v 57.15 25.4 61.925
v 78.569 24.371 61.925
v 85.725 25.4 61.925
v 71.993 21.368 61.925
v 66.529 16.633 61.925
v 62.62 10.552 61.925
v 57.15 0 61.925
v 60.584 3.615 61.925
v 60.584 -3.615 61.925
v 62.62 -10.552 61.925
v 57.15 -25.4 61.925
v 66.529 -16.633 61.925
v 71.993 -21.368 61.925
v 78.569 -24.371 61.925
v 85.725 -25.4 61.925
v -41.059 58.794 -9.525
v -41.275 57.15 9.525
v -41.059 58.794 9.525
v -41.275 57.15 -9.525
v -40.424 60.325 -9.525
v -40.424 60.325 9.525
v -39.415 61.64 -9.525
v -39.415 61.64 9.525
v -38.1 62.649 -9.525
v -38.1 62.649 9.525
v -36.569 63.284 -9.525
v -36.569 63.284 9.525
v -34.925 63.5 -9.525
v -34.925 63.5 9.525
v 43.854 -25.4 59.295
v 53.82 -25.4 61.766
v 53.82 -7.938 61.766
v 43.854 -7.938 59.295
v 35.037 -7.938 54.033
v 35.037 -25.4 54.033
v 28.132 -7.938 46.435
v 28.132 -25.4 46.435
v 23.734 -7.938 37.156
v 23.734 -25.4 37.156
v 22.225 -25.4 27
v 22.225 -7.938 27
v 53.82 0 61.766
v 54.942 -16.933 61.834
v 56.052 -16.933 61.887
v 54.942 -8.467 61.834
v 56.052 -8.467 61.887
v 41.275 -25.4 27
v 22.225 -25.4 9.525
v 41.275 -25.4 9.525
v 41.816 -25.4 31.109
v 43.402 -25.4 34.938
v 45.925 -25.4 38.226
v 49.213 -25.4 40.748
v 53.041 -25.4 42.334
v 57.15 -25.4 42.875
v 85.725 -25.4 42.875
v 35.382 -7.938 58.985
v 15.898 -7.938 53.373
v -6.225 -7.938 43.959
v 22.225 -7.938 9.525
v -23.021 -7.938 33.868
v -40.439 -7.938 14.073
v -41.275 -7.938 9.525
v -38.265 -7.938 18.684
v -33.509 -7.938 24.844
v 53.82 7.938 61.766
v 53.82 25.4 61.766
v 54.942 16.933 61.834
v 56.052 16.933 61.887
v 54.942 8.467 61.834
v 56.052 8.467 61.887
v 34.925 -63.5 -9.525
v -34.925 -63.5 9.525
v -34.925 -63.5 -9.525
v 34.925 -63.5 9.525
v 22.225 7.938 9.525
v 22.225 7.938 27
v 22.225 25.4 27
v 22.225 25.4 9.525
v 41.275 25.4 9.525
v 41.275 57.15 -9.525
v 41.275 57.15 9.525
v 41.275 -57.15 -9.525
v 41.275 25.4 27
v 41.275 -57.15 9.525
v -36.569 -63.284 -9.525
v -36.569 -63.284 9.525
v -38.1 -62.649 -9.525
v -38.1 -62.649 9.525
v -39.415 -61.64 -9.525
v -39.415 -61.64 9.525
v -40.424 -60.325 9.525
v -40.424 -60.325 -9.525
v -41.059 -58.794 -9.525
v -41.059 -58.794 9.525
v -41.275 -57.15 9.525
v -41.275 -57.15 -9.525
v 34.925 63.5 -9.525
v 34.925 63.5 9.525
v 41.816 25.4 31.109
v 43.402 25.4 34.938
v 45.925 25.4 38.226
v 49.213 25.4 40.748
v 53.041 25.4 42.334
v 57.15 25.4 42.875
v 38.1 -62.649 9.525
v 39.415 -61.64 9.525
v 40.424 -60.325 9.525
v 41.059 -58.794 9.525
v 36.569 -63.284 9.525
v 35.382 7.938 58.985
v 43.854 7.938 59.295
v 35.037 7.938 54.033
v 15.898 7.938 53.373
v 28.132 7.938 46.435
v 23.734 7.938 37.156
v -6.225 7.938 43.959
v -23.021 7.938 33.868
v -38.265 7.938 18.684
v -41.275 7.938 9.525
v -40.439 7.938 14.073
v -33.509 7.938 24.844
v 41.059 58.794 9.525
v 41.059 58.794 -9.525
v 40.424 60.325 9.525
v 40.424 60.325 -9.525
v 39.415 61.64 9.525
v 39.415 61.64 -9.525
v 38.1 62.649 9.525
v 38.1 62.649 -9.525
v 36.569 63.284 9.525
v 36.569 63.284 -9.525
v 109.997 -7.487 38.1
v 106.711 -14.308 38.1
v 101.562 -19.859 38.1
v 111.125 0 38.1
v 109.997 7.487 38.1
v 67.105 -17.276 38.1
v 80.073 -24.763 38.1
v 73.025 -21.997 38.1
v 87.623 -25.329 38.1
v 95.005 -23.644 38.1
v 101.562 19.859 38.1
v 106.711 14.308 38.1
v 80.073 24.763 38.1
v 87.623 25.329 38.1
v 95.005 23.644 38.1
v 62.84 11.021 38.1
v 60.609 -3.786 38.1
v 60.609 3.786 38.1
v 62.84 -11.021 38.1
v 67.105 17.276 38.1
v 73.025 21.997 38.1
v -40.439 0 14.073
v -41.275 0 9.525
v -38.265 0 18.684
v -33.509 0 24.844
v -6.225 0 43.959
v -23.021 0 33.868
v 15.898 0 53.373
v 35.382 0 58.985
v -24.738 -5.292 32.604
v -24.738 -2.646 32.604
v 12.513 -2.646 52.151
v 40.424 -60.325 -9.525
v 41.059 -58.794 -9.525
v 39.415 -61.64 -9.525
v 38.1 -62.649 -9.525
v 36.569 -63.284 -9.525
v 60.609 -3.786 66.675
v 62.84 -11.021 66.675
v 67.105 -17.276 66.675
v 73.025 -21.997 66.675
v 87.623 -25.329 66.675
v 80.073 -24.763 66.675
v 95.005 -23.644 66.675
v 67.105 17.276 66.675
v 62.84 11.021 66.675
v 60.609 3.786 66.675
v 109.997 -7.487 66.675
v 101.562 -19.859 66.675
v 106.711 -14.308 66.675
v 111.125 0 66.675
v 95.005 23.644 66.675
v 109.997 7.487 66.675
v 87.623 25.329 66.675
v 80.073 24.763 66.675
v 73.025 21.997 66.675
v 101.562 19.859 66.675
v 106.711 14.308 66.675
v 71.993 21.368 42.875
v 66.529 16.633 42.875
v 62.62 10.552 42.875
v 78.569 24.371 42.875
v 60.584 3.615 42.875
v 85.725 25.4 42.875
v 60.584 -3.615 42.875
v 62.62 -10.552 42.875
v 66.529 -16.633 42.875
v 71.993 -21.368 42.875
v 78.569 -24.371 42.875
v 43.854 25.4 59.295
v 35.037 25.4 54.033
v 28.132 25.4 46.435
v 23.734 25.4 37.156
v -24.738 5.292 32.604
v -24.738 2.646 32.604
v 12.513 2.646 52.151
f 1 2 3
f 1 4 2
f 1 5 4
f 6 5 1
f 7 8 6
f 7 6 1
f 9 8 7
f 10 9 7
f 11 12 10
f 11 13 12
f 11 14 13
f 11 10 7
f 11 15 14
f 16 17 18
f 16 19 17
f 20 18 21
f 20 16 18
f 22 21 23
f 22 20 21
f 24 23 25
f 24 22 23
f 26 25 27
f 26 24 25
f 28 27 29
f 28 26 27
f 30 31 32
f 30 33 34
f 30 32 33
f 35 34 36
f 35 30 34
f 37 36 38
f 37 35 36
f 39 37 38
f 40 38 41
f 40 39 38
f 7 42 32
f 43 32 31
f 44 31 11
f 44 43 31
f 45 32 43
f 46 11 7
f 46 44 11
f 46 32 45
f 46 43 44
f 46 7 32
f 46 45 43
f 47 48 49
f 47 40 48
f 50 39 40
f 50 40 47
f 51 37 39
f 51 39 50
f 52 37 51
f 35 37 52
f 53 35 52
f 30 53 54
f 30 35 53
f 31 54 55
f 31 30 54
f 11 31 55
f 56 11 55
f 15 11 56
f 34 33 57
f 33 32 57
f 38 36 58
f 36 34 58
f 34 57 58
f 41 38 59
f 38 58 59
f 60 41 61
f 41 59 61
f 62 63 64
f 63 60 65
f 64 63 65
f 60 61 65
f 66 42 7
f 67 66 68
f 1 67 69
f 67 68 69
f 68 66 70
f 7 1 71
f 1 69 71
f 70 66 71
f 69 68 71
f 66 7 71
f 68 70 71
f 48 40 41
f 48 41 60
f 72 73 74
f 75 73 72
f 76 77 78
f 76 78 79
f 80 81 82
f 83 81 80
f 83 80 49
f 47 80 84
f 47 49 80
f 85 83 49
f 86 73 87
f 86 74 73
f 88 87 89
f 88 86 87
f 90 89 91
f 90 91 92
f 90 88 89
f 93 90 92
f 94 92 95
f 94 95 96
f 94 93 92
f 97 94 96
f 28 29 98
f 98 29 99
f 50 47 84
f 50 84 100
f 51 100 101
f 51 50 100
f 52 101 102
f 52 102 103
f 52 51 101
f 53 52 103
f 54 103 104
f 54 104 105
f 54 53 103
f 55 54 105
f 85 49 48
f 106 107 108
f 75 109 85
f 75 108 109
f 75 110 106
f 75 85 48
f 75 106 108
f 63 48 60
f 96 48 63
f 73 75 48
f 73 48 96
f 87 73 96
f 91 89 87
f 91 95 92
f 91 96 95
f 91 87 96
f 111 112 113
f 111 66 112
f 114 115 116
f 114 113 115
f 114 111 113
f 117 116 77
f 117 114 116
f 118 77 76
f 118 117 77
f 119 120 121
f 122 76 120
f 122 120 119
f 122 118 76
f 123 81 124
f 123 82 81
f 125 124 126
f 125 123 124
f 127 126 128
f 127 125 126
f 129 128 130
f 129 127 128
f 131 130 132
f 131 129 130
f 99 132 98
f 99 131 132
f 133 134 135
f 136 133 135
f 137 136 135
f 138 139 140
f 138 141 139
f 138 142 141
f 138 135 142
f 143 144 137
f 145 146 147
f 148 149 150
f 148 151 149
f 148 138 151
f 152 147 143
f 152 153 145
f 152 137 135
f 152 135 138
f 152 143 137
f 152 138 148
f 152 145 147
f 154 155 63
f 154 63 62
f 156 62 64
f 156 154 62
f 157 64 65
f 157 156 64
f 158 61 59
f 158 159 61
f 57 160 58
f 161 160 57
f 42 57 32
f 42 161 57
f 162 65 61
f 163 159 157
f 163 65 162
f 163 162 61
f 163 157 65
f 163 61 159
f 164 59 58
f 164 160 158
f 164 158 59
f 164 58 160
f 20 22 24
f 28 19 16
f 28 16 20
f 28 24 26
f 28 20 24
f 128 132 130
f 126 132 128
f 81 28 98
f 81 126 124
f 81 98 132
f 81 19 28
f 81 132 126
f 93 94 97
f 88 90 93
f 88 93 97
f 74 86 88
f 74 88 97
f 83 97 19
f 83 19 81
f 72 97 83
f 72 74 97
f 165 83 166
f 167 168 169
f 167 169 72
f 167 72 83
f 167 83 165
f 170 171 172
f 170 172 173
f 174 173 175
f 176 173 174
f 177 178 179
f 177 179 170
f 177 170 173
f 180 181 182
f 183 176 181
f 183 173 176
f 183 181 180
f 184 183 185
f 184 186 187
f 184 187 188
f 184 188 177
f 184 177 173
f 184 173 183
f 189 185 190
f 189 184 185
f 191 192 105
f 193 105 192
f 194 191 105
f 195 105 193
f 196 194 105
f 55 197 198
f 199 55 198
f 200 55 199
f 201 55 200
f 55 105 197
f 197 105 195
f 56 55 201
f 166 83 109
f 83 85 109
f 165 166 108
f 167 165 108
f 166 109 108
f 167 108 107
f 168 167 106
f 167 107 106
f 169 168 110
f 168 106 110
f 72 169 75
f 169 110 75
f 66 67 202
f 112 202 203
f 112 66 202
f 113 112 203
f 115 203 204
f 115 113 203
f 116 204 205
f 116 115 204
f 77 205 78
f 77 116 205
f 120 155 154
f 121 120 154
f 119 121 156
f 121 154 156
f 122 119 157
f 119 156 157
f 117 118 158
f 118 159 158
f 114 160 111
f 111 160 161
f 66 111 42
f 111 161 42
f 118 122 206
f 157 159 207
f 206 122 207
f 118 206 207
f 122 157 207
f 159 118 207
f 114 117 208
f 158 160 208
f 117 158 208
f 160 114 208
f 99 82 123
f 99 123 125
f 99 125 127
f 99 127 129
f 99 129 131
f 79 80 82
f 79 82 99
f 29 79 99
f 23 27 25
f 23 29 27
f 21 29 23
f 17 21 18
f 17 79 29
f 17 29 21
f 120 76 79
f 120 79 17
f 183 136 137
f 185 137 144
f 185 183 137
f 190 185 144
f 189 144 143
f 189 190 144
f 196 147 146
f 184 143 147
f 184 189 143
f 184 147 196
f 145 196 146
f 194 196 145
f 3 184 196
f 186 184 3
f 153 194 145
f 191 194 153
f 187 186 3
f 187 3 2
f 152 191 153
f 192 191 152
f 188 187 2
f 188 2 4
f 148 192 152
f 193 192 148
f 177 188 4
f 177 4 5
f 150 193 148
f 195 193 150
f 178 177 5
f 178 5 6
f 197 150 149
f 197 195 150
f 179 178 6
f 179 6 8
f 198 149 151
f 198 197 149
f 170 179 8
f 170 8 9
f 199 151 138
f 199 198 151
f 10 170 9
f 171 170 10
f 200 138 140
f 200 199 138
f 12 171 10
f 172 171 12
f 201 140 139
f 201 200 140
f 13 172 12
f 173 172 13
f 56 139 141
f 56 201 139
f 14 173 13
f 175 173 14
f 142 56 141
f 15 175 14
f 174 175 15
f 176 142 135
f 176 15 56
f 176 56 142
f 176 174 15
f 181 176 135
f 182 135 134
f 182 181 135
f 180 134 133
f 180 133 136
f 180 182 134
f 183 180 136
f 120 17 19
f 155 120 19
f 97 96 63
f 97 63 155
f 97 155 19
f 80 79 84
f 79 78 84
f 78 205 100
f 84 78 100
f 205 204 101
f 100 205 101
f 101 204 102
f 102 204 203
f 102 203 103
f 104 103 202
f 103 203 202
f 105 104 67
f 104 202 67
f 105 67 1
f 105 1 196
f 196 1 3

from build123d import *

# Parameters (mm, degrees)
F1_DEPTH      = 63.5
F1_DEPTH_BACK = 63.5
F0_W          = 25.4
F0_H          = 19.05
F2_DEPTH      = 25.4
F2_DEPTH_BACK = 25.4
F3_DEPTH      = 7.9375
F5_R          = 6.35


with BuildPart() as f1:
    # F0 (on Front) → F1 (new body, two sides)
    with BuildSketch(Plane.XZ) as f1_sk:
        Polygon((-41.275, 9.525), (-41.275, -9.525), (41.275, -9.525), (41.275, 9.525), (22.225, 9.525), align=None)
    extrude(amount=F1_DEPTH)
    extrude(f1_sk.sketch, amount=-F1_DEPTH_BACK)

    # F0 (on Front) → F2 (join, two sides)
    with BuildSketch(Plane.XZ) as f2_sk:
        with BuildLine():
            Line((22.225, 9.525), (41.275, 9.525))
            Line((41.275, 9.525), (41.275, 27.0002))
            ThreePointArc((41.275, 27.0002), (45.9246798487, 38.2255201513), (57.15, 42.8752))
            Line((57.15, 42.8752), (60.325, 42.8752))
            Line((60.325, 42.8752), (60.325, 61.9252))
            Line((60.325, 61.9252), (57.15, 61.9252))
            add(Edge.make_bspline(
                [(53.8198051539, 61.7660658354), (54.9473735192, 61.8411835235), (56.058102729, 61.8944833959), (57.15, 61.9252)],
                knots=[108.2731694202, 108.2731694202, 108.2731694202, 108.2731694202, 111.5045361635, 111.5045361635, 111.5045361635, 111.5045361635], degree=3))
            ThreePointArc((53.8198051539, 61.7660658354), (31.30369775, 50.4890119112), (22.225, 27.0002))
            Line((22.225, 27.0002), (22.225, 9.525))
        make_face()
        with Locations((73.025, 52.4002)):
            Rectangle(F0_W, F0_H)
    extrude(amount=F2_DEPTH)
    extrude(f2_sk.sketch, amount=-F2_DEPTH_BACK)

    # F0 (on Front) → F3 (join, symmetric)
    with BuildSketch(Plane.XZ):
        with BuildLine():
            add(Edge.make_bspline(
                [(-41.275, 9.525), (-40.6484546844, 32.2369696222), (16.0384543074, 59.2491029489), (53.8198051539, 61.7660658354)],
                knots=[0, 0, 0, 0, 108.2731694202, 108.2731694202, 108.2731694202, 108.2731694202], degree=3))
            Line((-41.275, 9.525), (22.225, 9.525))
            Line((22.225, 9.525), (22.225, 27.0002))
            ThreePointArc((22.225, 27.0002), (31.30369775, 50.4890119112), (53.8198051539, 61.7660658354))
        make_face()
    extrude(amount=F3_DEPTH, both=True)

    # F0 (on Front) → F4 (revolve)
    with BuildSketch(Plane.XZ):
        Polygon((85.725, 66.675), (85.725, 61.9252), (85.725, 42.8752), (85.725, 38.1), (111.125, 38.1), (111.125, 66.675), align=None)
    revolve(axis=Axis((85.725, 0, 52.3875), (0, 0, 1)))

    # F5
    f5_edges = [f1.edges().sort_by_distance(p)[0] for p in [
        (41.275, -63.5, 0),
        (-41.275, -63.5, 0),
        (-41.275, 63.5, 0),
        (41.275, 63.5, 0),
    ]]
    fillet(f5_edges, radius=F5_R)


solid = f1.part
